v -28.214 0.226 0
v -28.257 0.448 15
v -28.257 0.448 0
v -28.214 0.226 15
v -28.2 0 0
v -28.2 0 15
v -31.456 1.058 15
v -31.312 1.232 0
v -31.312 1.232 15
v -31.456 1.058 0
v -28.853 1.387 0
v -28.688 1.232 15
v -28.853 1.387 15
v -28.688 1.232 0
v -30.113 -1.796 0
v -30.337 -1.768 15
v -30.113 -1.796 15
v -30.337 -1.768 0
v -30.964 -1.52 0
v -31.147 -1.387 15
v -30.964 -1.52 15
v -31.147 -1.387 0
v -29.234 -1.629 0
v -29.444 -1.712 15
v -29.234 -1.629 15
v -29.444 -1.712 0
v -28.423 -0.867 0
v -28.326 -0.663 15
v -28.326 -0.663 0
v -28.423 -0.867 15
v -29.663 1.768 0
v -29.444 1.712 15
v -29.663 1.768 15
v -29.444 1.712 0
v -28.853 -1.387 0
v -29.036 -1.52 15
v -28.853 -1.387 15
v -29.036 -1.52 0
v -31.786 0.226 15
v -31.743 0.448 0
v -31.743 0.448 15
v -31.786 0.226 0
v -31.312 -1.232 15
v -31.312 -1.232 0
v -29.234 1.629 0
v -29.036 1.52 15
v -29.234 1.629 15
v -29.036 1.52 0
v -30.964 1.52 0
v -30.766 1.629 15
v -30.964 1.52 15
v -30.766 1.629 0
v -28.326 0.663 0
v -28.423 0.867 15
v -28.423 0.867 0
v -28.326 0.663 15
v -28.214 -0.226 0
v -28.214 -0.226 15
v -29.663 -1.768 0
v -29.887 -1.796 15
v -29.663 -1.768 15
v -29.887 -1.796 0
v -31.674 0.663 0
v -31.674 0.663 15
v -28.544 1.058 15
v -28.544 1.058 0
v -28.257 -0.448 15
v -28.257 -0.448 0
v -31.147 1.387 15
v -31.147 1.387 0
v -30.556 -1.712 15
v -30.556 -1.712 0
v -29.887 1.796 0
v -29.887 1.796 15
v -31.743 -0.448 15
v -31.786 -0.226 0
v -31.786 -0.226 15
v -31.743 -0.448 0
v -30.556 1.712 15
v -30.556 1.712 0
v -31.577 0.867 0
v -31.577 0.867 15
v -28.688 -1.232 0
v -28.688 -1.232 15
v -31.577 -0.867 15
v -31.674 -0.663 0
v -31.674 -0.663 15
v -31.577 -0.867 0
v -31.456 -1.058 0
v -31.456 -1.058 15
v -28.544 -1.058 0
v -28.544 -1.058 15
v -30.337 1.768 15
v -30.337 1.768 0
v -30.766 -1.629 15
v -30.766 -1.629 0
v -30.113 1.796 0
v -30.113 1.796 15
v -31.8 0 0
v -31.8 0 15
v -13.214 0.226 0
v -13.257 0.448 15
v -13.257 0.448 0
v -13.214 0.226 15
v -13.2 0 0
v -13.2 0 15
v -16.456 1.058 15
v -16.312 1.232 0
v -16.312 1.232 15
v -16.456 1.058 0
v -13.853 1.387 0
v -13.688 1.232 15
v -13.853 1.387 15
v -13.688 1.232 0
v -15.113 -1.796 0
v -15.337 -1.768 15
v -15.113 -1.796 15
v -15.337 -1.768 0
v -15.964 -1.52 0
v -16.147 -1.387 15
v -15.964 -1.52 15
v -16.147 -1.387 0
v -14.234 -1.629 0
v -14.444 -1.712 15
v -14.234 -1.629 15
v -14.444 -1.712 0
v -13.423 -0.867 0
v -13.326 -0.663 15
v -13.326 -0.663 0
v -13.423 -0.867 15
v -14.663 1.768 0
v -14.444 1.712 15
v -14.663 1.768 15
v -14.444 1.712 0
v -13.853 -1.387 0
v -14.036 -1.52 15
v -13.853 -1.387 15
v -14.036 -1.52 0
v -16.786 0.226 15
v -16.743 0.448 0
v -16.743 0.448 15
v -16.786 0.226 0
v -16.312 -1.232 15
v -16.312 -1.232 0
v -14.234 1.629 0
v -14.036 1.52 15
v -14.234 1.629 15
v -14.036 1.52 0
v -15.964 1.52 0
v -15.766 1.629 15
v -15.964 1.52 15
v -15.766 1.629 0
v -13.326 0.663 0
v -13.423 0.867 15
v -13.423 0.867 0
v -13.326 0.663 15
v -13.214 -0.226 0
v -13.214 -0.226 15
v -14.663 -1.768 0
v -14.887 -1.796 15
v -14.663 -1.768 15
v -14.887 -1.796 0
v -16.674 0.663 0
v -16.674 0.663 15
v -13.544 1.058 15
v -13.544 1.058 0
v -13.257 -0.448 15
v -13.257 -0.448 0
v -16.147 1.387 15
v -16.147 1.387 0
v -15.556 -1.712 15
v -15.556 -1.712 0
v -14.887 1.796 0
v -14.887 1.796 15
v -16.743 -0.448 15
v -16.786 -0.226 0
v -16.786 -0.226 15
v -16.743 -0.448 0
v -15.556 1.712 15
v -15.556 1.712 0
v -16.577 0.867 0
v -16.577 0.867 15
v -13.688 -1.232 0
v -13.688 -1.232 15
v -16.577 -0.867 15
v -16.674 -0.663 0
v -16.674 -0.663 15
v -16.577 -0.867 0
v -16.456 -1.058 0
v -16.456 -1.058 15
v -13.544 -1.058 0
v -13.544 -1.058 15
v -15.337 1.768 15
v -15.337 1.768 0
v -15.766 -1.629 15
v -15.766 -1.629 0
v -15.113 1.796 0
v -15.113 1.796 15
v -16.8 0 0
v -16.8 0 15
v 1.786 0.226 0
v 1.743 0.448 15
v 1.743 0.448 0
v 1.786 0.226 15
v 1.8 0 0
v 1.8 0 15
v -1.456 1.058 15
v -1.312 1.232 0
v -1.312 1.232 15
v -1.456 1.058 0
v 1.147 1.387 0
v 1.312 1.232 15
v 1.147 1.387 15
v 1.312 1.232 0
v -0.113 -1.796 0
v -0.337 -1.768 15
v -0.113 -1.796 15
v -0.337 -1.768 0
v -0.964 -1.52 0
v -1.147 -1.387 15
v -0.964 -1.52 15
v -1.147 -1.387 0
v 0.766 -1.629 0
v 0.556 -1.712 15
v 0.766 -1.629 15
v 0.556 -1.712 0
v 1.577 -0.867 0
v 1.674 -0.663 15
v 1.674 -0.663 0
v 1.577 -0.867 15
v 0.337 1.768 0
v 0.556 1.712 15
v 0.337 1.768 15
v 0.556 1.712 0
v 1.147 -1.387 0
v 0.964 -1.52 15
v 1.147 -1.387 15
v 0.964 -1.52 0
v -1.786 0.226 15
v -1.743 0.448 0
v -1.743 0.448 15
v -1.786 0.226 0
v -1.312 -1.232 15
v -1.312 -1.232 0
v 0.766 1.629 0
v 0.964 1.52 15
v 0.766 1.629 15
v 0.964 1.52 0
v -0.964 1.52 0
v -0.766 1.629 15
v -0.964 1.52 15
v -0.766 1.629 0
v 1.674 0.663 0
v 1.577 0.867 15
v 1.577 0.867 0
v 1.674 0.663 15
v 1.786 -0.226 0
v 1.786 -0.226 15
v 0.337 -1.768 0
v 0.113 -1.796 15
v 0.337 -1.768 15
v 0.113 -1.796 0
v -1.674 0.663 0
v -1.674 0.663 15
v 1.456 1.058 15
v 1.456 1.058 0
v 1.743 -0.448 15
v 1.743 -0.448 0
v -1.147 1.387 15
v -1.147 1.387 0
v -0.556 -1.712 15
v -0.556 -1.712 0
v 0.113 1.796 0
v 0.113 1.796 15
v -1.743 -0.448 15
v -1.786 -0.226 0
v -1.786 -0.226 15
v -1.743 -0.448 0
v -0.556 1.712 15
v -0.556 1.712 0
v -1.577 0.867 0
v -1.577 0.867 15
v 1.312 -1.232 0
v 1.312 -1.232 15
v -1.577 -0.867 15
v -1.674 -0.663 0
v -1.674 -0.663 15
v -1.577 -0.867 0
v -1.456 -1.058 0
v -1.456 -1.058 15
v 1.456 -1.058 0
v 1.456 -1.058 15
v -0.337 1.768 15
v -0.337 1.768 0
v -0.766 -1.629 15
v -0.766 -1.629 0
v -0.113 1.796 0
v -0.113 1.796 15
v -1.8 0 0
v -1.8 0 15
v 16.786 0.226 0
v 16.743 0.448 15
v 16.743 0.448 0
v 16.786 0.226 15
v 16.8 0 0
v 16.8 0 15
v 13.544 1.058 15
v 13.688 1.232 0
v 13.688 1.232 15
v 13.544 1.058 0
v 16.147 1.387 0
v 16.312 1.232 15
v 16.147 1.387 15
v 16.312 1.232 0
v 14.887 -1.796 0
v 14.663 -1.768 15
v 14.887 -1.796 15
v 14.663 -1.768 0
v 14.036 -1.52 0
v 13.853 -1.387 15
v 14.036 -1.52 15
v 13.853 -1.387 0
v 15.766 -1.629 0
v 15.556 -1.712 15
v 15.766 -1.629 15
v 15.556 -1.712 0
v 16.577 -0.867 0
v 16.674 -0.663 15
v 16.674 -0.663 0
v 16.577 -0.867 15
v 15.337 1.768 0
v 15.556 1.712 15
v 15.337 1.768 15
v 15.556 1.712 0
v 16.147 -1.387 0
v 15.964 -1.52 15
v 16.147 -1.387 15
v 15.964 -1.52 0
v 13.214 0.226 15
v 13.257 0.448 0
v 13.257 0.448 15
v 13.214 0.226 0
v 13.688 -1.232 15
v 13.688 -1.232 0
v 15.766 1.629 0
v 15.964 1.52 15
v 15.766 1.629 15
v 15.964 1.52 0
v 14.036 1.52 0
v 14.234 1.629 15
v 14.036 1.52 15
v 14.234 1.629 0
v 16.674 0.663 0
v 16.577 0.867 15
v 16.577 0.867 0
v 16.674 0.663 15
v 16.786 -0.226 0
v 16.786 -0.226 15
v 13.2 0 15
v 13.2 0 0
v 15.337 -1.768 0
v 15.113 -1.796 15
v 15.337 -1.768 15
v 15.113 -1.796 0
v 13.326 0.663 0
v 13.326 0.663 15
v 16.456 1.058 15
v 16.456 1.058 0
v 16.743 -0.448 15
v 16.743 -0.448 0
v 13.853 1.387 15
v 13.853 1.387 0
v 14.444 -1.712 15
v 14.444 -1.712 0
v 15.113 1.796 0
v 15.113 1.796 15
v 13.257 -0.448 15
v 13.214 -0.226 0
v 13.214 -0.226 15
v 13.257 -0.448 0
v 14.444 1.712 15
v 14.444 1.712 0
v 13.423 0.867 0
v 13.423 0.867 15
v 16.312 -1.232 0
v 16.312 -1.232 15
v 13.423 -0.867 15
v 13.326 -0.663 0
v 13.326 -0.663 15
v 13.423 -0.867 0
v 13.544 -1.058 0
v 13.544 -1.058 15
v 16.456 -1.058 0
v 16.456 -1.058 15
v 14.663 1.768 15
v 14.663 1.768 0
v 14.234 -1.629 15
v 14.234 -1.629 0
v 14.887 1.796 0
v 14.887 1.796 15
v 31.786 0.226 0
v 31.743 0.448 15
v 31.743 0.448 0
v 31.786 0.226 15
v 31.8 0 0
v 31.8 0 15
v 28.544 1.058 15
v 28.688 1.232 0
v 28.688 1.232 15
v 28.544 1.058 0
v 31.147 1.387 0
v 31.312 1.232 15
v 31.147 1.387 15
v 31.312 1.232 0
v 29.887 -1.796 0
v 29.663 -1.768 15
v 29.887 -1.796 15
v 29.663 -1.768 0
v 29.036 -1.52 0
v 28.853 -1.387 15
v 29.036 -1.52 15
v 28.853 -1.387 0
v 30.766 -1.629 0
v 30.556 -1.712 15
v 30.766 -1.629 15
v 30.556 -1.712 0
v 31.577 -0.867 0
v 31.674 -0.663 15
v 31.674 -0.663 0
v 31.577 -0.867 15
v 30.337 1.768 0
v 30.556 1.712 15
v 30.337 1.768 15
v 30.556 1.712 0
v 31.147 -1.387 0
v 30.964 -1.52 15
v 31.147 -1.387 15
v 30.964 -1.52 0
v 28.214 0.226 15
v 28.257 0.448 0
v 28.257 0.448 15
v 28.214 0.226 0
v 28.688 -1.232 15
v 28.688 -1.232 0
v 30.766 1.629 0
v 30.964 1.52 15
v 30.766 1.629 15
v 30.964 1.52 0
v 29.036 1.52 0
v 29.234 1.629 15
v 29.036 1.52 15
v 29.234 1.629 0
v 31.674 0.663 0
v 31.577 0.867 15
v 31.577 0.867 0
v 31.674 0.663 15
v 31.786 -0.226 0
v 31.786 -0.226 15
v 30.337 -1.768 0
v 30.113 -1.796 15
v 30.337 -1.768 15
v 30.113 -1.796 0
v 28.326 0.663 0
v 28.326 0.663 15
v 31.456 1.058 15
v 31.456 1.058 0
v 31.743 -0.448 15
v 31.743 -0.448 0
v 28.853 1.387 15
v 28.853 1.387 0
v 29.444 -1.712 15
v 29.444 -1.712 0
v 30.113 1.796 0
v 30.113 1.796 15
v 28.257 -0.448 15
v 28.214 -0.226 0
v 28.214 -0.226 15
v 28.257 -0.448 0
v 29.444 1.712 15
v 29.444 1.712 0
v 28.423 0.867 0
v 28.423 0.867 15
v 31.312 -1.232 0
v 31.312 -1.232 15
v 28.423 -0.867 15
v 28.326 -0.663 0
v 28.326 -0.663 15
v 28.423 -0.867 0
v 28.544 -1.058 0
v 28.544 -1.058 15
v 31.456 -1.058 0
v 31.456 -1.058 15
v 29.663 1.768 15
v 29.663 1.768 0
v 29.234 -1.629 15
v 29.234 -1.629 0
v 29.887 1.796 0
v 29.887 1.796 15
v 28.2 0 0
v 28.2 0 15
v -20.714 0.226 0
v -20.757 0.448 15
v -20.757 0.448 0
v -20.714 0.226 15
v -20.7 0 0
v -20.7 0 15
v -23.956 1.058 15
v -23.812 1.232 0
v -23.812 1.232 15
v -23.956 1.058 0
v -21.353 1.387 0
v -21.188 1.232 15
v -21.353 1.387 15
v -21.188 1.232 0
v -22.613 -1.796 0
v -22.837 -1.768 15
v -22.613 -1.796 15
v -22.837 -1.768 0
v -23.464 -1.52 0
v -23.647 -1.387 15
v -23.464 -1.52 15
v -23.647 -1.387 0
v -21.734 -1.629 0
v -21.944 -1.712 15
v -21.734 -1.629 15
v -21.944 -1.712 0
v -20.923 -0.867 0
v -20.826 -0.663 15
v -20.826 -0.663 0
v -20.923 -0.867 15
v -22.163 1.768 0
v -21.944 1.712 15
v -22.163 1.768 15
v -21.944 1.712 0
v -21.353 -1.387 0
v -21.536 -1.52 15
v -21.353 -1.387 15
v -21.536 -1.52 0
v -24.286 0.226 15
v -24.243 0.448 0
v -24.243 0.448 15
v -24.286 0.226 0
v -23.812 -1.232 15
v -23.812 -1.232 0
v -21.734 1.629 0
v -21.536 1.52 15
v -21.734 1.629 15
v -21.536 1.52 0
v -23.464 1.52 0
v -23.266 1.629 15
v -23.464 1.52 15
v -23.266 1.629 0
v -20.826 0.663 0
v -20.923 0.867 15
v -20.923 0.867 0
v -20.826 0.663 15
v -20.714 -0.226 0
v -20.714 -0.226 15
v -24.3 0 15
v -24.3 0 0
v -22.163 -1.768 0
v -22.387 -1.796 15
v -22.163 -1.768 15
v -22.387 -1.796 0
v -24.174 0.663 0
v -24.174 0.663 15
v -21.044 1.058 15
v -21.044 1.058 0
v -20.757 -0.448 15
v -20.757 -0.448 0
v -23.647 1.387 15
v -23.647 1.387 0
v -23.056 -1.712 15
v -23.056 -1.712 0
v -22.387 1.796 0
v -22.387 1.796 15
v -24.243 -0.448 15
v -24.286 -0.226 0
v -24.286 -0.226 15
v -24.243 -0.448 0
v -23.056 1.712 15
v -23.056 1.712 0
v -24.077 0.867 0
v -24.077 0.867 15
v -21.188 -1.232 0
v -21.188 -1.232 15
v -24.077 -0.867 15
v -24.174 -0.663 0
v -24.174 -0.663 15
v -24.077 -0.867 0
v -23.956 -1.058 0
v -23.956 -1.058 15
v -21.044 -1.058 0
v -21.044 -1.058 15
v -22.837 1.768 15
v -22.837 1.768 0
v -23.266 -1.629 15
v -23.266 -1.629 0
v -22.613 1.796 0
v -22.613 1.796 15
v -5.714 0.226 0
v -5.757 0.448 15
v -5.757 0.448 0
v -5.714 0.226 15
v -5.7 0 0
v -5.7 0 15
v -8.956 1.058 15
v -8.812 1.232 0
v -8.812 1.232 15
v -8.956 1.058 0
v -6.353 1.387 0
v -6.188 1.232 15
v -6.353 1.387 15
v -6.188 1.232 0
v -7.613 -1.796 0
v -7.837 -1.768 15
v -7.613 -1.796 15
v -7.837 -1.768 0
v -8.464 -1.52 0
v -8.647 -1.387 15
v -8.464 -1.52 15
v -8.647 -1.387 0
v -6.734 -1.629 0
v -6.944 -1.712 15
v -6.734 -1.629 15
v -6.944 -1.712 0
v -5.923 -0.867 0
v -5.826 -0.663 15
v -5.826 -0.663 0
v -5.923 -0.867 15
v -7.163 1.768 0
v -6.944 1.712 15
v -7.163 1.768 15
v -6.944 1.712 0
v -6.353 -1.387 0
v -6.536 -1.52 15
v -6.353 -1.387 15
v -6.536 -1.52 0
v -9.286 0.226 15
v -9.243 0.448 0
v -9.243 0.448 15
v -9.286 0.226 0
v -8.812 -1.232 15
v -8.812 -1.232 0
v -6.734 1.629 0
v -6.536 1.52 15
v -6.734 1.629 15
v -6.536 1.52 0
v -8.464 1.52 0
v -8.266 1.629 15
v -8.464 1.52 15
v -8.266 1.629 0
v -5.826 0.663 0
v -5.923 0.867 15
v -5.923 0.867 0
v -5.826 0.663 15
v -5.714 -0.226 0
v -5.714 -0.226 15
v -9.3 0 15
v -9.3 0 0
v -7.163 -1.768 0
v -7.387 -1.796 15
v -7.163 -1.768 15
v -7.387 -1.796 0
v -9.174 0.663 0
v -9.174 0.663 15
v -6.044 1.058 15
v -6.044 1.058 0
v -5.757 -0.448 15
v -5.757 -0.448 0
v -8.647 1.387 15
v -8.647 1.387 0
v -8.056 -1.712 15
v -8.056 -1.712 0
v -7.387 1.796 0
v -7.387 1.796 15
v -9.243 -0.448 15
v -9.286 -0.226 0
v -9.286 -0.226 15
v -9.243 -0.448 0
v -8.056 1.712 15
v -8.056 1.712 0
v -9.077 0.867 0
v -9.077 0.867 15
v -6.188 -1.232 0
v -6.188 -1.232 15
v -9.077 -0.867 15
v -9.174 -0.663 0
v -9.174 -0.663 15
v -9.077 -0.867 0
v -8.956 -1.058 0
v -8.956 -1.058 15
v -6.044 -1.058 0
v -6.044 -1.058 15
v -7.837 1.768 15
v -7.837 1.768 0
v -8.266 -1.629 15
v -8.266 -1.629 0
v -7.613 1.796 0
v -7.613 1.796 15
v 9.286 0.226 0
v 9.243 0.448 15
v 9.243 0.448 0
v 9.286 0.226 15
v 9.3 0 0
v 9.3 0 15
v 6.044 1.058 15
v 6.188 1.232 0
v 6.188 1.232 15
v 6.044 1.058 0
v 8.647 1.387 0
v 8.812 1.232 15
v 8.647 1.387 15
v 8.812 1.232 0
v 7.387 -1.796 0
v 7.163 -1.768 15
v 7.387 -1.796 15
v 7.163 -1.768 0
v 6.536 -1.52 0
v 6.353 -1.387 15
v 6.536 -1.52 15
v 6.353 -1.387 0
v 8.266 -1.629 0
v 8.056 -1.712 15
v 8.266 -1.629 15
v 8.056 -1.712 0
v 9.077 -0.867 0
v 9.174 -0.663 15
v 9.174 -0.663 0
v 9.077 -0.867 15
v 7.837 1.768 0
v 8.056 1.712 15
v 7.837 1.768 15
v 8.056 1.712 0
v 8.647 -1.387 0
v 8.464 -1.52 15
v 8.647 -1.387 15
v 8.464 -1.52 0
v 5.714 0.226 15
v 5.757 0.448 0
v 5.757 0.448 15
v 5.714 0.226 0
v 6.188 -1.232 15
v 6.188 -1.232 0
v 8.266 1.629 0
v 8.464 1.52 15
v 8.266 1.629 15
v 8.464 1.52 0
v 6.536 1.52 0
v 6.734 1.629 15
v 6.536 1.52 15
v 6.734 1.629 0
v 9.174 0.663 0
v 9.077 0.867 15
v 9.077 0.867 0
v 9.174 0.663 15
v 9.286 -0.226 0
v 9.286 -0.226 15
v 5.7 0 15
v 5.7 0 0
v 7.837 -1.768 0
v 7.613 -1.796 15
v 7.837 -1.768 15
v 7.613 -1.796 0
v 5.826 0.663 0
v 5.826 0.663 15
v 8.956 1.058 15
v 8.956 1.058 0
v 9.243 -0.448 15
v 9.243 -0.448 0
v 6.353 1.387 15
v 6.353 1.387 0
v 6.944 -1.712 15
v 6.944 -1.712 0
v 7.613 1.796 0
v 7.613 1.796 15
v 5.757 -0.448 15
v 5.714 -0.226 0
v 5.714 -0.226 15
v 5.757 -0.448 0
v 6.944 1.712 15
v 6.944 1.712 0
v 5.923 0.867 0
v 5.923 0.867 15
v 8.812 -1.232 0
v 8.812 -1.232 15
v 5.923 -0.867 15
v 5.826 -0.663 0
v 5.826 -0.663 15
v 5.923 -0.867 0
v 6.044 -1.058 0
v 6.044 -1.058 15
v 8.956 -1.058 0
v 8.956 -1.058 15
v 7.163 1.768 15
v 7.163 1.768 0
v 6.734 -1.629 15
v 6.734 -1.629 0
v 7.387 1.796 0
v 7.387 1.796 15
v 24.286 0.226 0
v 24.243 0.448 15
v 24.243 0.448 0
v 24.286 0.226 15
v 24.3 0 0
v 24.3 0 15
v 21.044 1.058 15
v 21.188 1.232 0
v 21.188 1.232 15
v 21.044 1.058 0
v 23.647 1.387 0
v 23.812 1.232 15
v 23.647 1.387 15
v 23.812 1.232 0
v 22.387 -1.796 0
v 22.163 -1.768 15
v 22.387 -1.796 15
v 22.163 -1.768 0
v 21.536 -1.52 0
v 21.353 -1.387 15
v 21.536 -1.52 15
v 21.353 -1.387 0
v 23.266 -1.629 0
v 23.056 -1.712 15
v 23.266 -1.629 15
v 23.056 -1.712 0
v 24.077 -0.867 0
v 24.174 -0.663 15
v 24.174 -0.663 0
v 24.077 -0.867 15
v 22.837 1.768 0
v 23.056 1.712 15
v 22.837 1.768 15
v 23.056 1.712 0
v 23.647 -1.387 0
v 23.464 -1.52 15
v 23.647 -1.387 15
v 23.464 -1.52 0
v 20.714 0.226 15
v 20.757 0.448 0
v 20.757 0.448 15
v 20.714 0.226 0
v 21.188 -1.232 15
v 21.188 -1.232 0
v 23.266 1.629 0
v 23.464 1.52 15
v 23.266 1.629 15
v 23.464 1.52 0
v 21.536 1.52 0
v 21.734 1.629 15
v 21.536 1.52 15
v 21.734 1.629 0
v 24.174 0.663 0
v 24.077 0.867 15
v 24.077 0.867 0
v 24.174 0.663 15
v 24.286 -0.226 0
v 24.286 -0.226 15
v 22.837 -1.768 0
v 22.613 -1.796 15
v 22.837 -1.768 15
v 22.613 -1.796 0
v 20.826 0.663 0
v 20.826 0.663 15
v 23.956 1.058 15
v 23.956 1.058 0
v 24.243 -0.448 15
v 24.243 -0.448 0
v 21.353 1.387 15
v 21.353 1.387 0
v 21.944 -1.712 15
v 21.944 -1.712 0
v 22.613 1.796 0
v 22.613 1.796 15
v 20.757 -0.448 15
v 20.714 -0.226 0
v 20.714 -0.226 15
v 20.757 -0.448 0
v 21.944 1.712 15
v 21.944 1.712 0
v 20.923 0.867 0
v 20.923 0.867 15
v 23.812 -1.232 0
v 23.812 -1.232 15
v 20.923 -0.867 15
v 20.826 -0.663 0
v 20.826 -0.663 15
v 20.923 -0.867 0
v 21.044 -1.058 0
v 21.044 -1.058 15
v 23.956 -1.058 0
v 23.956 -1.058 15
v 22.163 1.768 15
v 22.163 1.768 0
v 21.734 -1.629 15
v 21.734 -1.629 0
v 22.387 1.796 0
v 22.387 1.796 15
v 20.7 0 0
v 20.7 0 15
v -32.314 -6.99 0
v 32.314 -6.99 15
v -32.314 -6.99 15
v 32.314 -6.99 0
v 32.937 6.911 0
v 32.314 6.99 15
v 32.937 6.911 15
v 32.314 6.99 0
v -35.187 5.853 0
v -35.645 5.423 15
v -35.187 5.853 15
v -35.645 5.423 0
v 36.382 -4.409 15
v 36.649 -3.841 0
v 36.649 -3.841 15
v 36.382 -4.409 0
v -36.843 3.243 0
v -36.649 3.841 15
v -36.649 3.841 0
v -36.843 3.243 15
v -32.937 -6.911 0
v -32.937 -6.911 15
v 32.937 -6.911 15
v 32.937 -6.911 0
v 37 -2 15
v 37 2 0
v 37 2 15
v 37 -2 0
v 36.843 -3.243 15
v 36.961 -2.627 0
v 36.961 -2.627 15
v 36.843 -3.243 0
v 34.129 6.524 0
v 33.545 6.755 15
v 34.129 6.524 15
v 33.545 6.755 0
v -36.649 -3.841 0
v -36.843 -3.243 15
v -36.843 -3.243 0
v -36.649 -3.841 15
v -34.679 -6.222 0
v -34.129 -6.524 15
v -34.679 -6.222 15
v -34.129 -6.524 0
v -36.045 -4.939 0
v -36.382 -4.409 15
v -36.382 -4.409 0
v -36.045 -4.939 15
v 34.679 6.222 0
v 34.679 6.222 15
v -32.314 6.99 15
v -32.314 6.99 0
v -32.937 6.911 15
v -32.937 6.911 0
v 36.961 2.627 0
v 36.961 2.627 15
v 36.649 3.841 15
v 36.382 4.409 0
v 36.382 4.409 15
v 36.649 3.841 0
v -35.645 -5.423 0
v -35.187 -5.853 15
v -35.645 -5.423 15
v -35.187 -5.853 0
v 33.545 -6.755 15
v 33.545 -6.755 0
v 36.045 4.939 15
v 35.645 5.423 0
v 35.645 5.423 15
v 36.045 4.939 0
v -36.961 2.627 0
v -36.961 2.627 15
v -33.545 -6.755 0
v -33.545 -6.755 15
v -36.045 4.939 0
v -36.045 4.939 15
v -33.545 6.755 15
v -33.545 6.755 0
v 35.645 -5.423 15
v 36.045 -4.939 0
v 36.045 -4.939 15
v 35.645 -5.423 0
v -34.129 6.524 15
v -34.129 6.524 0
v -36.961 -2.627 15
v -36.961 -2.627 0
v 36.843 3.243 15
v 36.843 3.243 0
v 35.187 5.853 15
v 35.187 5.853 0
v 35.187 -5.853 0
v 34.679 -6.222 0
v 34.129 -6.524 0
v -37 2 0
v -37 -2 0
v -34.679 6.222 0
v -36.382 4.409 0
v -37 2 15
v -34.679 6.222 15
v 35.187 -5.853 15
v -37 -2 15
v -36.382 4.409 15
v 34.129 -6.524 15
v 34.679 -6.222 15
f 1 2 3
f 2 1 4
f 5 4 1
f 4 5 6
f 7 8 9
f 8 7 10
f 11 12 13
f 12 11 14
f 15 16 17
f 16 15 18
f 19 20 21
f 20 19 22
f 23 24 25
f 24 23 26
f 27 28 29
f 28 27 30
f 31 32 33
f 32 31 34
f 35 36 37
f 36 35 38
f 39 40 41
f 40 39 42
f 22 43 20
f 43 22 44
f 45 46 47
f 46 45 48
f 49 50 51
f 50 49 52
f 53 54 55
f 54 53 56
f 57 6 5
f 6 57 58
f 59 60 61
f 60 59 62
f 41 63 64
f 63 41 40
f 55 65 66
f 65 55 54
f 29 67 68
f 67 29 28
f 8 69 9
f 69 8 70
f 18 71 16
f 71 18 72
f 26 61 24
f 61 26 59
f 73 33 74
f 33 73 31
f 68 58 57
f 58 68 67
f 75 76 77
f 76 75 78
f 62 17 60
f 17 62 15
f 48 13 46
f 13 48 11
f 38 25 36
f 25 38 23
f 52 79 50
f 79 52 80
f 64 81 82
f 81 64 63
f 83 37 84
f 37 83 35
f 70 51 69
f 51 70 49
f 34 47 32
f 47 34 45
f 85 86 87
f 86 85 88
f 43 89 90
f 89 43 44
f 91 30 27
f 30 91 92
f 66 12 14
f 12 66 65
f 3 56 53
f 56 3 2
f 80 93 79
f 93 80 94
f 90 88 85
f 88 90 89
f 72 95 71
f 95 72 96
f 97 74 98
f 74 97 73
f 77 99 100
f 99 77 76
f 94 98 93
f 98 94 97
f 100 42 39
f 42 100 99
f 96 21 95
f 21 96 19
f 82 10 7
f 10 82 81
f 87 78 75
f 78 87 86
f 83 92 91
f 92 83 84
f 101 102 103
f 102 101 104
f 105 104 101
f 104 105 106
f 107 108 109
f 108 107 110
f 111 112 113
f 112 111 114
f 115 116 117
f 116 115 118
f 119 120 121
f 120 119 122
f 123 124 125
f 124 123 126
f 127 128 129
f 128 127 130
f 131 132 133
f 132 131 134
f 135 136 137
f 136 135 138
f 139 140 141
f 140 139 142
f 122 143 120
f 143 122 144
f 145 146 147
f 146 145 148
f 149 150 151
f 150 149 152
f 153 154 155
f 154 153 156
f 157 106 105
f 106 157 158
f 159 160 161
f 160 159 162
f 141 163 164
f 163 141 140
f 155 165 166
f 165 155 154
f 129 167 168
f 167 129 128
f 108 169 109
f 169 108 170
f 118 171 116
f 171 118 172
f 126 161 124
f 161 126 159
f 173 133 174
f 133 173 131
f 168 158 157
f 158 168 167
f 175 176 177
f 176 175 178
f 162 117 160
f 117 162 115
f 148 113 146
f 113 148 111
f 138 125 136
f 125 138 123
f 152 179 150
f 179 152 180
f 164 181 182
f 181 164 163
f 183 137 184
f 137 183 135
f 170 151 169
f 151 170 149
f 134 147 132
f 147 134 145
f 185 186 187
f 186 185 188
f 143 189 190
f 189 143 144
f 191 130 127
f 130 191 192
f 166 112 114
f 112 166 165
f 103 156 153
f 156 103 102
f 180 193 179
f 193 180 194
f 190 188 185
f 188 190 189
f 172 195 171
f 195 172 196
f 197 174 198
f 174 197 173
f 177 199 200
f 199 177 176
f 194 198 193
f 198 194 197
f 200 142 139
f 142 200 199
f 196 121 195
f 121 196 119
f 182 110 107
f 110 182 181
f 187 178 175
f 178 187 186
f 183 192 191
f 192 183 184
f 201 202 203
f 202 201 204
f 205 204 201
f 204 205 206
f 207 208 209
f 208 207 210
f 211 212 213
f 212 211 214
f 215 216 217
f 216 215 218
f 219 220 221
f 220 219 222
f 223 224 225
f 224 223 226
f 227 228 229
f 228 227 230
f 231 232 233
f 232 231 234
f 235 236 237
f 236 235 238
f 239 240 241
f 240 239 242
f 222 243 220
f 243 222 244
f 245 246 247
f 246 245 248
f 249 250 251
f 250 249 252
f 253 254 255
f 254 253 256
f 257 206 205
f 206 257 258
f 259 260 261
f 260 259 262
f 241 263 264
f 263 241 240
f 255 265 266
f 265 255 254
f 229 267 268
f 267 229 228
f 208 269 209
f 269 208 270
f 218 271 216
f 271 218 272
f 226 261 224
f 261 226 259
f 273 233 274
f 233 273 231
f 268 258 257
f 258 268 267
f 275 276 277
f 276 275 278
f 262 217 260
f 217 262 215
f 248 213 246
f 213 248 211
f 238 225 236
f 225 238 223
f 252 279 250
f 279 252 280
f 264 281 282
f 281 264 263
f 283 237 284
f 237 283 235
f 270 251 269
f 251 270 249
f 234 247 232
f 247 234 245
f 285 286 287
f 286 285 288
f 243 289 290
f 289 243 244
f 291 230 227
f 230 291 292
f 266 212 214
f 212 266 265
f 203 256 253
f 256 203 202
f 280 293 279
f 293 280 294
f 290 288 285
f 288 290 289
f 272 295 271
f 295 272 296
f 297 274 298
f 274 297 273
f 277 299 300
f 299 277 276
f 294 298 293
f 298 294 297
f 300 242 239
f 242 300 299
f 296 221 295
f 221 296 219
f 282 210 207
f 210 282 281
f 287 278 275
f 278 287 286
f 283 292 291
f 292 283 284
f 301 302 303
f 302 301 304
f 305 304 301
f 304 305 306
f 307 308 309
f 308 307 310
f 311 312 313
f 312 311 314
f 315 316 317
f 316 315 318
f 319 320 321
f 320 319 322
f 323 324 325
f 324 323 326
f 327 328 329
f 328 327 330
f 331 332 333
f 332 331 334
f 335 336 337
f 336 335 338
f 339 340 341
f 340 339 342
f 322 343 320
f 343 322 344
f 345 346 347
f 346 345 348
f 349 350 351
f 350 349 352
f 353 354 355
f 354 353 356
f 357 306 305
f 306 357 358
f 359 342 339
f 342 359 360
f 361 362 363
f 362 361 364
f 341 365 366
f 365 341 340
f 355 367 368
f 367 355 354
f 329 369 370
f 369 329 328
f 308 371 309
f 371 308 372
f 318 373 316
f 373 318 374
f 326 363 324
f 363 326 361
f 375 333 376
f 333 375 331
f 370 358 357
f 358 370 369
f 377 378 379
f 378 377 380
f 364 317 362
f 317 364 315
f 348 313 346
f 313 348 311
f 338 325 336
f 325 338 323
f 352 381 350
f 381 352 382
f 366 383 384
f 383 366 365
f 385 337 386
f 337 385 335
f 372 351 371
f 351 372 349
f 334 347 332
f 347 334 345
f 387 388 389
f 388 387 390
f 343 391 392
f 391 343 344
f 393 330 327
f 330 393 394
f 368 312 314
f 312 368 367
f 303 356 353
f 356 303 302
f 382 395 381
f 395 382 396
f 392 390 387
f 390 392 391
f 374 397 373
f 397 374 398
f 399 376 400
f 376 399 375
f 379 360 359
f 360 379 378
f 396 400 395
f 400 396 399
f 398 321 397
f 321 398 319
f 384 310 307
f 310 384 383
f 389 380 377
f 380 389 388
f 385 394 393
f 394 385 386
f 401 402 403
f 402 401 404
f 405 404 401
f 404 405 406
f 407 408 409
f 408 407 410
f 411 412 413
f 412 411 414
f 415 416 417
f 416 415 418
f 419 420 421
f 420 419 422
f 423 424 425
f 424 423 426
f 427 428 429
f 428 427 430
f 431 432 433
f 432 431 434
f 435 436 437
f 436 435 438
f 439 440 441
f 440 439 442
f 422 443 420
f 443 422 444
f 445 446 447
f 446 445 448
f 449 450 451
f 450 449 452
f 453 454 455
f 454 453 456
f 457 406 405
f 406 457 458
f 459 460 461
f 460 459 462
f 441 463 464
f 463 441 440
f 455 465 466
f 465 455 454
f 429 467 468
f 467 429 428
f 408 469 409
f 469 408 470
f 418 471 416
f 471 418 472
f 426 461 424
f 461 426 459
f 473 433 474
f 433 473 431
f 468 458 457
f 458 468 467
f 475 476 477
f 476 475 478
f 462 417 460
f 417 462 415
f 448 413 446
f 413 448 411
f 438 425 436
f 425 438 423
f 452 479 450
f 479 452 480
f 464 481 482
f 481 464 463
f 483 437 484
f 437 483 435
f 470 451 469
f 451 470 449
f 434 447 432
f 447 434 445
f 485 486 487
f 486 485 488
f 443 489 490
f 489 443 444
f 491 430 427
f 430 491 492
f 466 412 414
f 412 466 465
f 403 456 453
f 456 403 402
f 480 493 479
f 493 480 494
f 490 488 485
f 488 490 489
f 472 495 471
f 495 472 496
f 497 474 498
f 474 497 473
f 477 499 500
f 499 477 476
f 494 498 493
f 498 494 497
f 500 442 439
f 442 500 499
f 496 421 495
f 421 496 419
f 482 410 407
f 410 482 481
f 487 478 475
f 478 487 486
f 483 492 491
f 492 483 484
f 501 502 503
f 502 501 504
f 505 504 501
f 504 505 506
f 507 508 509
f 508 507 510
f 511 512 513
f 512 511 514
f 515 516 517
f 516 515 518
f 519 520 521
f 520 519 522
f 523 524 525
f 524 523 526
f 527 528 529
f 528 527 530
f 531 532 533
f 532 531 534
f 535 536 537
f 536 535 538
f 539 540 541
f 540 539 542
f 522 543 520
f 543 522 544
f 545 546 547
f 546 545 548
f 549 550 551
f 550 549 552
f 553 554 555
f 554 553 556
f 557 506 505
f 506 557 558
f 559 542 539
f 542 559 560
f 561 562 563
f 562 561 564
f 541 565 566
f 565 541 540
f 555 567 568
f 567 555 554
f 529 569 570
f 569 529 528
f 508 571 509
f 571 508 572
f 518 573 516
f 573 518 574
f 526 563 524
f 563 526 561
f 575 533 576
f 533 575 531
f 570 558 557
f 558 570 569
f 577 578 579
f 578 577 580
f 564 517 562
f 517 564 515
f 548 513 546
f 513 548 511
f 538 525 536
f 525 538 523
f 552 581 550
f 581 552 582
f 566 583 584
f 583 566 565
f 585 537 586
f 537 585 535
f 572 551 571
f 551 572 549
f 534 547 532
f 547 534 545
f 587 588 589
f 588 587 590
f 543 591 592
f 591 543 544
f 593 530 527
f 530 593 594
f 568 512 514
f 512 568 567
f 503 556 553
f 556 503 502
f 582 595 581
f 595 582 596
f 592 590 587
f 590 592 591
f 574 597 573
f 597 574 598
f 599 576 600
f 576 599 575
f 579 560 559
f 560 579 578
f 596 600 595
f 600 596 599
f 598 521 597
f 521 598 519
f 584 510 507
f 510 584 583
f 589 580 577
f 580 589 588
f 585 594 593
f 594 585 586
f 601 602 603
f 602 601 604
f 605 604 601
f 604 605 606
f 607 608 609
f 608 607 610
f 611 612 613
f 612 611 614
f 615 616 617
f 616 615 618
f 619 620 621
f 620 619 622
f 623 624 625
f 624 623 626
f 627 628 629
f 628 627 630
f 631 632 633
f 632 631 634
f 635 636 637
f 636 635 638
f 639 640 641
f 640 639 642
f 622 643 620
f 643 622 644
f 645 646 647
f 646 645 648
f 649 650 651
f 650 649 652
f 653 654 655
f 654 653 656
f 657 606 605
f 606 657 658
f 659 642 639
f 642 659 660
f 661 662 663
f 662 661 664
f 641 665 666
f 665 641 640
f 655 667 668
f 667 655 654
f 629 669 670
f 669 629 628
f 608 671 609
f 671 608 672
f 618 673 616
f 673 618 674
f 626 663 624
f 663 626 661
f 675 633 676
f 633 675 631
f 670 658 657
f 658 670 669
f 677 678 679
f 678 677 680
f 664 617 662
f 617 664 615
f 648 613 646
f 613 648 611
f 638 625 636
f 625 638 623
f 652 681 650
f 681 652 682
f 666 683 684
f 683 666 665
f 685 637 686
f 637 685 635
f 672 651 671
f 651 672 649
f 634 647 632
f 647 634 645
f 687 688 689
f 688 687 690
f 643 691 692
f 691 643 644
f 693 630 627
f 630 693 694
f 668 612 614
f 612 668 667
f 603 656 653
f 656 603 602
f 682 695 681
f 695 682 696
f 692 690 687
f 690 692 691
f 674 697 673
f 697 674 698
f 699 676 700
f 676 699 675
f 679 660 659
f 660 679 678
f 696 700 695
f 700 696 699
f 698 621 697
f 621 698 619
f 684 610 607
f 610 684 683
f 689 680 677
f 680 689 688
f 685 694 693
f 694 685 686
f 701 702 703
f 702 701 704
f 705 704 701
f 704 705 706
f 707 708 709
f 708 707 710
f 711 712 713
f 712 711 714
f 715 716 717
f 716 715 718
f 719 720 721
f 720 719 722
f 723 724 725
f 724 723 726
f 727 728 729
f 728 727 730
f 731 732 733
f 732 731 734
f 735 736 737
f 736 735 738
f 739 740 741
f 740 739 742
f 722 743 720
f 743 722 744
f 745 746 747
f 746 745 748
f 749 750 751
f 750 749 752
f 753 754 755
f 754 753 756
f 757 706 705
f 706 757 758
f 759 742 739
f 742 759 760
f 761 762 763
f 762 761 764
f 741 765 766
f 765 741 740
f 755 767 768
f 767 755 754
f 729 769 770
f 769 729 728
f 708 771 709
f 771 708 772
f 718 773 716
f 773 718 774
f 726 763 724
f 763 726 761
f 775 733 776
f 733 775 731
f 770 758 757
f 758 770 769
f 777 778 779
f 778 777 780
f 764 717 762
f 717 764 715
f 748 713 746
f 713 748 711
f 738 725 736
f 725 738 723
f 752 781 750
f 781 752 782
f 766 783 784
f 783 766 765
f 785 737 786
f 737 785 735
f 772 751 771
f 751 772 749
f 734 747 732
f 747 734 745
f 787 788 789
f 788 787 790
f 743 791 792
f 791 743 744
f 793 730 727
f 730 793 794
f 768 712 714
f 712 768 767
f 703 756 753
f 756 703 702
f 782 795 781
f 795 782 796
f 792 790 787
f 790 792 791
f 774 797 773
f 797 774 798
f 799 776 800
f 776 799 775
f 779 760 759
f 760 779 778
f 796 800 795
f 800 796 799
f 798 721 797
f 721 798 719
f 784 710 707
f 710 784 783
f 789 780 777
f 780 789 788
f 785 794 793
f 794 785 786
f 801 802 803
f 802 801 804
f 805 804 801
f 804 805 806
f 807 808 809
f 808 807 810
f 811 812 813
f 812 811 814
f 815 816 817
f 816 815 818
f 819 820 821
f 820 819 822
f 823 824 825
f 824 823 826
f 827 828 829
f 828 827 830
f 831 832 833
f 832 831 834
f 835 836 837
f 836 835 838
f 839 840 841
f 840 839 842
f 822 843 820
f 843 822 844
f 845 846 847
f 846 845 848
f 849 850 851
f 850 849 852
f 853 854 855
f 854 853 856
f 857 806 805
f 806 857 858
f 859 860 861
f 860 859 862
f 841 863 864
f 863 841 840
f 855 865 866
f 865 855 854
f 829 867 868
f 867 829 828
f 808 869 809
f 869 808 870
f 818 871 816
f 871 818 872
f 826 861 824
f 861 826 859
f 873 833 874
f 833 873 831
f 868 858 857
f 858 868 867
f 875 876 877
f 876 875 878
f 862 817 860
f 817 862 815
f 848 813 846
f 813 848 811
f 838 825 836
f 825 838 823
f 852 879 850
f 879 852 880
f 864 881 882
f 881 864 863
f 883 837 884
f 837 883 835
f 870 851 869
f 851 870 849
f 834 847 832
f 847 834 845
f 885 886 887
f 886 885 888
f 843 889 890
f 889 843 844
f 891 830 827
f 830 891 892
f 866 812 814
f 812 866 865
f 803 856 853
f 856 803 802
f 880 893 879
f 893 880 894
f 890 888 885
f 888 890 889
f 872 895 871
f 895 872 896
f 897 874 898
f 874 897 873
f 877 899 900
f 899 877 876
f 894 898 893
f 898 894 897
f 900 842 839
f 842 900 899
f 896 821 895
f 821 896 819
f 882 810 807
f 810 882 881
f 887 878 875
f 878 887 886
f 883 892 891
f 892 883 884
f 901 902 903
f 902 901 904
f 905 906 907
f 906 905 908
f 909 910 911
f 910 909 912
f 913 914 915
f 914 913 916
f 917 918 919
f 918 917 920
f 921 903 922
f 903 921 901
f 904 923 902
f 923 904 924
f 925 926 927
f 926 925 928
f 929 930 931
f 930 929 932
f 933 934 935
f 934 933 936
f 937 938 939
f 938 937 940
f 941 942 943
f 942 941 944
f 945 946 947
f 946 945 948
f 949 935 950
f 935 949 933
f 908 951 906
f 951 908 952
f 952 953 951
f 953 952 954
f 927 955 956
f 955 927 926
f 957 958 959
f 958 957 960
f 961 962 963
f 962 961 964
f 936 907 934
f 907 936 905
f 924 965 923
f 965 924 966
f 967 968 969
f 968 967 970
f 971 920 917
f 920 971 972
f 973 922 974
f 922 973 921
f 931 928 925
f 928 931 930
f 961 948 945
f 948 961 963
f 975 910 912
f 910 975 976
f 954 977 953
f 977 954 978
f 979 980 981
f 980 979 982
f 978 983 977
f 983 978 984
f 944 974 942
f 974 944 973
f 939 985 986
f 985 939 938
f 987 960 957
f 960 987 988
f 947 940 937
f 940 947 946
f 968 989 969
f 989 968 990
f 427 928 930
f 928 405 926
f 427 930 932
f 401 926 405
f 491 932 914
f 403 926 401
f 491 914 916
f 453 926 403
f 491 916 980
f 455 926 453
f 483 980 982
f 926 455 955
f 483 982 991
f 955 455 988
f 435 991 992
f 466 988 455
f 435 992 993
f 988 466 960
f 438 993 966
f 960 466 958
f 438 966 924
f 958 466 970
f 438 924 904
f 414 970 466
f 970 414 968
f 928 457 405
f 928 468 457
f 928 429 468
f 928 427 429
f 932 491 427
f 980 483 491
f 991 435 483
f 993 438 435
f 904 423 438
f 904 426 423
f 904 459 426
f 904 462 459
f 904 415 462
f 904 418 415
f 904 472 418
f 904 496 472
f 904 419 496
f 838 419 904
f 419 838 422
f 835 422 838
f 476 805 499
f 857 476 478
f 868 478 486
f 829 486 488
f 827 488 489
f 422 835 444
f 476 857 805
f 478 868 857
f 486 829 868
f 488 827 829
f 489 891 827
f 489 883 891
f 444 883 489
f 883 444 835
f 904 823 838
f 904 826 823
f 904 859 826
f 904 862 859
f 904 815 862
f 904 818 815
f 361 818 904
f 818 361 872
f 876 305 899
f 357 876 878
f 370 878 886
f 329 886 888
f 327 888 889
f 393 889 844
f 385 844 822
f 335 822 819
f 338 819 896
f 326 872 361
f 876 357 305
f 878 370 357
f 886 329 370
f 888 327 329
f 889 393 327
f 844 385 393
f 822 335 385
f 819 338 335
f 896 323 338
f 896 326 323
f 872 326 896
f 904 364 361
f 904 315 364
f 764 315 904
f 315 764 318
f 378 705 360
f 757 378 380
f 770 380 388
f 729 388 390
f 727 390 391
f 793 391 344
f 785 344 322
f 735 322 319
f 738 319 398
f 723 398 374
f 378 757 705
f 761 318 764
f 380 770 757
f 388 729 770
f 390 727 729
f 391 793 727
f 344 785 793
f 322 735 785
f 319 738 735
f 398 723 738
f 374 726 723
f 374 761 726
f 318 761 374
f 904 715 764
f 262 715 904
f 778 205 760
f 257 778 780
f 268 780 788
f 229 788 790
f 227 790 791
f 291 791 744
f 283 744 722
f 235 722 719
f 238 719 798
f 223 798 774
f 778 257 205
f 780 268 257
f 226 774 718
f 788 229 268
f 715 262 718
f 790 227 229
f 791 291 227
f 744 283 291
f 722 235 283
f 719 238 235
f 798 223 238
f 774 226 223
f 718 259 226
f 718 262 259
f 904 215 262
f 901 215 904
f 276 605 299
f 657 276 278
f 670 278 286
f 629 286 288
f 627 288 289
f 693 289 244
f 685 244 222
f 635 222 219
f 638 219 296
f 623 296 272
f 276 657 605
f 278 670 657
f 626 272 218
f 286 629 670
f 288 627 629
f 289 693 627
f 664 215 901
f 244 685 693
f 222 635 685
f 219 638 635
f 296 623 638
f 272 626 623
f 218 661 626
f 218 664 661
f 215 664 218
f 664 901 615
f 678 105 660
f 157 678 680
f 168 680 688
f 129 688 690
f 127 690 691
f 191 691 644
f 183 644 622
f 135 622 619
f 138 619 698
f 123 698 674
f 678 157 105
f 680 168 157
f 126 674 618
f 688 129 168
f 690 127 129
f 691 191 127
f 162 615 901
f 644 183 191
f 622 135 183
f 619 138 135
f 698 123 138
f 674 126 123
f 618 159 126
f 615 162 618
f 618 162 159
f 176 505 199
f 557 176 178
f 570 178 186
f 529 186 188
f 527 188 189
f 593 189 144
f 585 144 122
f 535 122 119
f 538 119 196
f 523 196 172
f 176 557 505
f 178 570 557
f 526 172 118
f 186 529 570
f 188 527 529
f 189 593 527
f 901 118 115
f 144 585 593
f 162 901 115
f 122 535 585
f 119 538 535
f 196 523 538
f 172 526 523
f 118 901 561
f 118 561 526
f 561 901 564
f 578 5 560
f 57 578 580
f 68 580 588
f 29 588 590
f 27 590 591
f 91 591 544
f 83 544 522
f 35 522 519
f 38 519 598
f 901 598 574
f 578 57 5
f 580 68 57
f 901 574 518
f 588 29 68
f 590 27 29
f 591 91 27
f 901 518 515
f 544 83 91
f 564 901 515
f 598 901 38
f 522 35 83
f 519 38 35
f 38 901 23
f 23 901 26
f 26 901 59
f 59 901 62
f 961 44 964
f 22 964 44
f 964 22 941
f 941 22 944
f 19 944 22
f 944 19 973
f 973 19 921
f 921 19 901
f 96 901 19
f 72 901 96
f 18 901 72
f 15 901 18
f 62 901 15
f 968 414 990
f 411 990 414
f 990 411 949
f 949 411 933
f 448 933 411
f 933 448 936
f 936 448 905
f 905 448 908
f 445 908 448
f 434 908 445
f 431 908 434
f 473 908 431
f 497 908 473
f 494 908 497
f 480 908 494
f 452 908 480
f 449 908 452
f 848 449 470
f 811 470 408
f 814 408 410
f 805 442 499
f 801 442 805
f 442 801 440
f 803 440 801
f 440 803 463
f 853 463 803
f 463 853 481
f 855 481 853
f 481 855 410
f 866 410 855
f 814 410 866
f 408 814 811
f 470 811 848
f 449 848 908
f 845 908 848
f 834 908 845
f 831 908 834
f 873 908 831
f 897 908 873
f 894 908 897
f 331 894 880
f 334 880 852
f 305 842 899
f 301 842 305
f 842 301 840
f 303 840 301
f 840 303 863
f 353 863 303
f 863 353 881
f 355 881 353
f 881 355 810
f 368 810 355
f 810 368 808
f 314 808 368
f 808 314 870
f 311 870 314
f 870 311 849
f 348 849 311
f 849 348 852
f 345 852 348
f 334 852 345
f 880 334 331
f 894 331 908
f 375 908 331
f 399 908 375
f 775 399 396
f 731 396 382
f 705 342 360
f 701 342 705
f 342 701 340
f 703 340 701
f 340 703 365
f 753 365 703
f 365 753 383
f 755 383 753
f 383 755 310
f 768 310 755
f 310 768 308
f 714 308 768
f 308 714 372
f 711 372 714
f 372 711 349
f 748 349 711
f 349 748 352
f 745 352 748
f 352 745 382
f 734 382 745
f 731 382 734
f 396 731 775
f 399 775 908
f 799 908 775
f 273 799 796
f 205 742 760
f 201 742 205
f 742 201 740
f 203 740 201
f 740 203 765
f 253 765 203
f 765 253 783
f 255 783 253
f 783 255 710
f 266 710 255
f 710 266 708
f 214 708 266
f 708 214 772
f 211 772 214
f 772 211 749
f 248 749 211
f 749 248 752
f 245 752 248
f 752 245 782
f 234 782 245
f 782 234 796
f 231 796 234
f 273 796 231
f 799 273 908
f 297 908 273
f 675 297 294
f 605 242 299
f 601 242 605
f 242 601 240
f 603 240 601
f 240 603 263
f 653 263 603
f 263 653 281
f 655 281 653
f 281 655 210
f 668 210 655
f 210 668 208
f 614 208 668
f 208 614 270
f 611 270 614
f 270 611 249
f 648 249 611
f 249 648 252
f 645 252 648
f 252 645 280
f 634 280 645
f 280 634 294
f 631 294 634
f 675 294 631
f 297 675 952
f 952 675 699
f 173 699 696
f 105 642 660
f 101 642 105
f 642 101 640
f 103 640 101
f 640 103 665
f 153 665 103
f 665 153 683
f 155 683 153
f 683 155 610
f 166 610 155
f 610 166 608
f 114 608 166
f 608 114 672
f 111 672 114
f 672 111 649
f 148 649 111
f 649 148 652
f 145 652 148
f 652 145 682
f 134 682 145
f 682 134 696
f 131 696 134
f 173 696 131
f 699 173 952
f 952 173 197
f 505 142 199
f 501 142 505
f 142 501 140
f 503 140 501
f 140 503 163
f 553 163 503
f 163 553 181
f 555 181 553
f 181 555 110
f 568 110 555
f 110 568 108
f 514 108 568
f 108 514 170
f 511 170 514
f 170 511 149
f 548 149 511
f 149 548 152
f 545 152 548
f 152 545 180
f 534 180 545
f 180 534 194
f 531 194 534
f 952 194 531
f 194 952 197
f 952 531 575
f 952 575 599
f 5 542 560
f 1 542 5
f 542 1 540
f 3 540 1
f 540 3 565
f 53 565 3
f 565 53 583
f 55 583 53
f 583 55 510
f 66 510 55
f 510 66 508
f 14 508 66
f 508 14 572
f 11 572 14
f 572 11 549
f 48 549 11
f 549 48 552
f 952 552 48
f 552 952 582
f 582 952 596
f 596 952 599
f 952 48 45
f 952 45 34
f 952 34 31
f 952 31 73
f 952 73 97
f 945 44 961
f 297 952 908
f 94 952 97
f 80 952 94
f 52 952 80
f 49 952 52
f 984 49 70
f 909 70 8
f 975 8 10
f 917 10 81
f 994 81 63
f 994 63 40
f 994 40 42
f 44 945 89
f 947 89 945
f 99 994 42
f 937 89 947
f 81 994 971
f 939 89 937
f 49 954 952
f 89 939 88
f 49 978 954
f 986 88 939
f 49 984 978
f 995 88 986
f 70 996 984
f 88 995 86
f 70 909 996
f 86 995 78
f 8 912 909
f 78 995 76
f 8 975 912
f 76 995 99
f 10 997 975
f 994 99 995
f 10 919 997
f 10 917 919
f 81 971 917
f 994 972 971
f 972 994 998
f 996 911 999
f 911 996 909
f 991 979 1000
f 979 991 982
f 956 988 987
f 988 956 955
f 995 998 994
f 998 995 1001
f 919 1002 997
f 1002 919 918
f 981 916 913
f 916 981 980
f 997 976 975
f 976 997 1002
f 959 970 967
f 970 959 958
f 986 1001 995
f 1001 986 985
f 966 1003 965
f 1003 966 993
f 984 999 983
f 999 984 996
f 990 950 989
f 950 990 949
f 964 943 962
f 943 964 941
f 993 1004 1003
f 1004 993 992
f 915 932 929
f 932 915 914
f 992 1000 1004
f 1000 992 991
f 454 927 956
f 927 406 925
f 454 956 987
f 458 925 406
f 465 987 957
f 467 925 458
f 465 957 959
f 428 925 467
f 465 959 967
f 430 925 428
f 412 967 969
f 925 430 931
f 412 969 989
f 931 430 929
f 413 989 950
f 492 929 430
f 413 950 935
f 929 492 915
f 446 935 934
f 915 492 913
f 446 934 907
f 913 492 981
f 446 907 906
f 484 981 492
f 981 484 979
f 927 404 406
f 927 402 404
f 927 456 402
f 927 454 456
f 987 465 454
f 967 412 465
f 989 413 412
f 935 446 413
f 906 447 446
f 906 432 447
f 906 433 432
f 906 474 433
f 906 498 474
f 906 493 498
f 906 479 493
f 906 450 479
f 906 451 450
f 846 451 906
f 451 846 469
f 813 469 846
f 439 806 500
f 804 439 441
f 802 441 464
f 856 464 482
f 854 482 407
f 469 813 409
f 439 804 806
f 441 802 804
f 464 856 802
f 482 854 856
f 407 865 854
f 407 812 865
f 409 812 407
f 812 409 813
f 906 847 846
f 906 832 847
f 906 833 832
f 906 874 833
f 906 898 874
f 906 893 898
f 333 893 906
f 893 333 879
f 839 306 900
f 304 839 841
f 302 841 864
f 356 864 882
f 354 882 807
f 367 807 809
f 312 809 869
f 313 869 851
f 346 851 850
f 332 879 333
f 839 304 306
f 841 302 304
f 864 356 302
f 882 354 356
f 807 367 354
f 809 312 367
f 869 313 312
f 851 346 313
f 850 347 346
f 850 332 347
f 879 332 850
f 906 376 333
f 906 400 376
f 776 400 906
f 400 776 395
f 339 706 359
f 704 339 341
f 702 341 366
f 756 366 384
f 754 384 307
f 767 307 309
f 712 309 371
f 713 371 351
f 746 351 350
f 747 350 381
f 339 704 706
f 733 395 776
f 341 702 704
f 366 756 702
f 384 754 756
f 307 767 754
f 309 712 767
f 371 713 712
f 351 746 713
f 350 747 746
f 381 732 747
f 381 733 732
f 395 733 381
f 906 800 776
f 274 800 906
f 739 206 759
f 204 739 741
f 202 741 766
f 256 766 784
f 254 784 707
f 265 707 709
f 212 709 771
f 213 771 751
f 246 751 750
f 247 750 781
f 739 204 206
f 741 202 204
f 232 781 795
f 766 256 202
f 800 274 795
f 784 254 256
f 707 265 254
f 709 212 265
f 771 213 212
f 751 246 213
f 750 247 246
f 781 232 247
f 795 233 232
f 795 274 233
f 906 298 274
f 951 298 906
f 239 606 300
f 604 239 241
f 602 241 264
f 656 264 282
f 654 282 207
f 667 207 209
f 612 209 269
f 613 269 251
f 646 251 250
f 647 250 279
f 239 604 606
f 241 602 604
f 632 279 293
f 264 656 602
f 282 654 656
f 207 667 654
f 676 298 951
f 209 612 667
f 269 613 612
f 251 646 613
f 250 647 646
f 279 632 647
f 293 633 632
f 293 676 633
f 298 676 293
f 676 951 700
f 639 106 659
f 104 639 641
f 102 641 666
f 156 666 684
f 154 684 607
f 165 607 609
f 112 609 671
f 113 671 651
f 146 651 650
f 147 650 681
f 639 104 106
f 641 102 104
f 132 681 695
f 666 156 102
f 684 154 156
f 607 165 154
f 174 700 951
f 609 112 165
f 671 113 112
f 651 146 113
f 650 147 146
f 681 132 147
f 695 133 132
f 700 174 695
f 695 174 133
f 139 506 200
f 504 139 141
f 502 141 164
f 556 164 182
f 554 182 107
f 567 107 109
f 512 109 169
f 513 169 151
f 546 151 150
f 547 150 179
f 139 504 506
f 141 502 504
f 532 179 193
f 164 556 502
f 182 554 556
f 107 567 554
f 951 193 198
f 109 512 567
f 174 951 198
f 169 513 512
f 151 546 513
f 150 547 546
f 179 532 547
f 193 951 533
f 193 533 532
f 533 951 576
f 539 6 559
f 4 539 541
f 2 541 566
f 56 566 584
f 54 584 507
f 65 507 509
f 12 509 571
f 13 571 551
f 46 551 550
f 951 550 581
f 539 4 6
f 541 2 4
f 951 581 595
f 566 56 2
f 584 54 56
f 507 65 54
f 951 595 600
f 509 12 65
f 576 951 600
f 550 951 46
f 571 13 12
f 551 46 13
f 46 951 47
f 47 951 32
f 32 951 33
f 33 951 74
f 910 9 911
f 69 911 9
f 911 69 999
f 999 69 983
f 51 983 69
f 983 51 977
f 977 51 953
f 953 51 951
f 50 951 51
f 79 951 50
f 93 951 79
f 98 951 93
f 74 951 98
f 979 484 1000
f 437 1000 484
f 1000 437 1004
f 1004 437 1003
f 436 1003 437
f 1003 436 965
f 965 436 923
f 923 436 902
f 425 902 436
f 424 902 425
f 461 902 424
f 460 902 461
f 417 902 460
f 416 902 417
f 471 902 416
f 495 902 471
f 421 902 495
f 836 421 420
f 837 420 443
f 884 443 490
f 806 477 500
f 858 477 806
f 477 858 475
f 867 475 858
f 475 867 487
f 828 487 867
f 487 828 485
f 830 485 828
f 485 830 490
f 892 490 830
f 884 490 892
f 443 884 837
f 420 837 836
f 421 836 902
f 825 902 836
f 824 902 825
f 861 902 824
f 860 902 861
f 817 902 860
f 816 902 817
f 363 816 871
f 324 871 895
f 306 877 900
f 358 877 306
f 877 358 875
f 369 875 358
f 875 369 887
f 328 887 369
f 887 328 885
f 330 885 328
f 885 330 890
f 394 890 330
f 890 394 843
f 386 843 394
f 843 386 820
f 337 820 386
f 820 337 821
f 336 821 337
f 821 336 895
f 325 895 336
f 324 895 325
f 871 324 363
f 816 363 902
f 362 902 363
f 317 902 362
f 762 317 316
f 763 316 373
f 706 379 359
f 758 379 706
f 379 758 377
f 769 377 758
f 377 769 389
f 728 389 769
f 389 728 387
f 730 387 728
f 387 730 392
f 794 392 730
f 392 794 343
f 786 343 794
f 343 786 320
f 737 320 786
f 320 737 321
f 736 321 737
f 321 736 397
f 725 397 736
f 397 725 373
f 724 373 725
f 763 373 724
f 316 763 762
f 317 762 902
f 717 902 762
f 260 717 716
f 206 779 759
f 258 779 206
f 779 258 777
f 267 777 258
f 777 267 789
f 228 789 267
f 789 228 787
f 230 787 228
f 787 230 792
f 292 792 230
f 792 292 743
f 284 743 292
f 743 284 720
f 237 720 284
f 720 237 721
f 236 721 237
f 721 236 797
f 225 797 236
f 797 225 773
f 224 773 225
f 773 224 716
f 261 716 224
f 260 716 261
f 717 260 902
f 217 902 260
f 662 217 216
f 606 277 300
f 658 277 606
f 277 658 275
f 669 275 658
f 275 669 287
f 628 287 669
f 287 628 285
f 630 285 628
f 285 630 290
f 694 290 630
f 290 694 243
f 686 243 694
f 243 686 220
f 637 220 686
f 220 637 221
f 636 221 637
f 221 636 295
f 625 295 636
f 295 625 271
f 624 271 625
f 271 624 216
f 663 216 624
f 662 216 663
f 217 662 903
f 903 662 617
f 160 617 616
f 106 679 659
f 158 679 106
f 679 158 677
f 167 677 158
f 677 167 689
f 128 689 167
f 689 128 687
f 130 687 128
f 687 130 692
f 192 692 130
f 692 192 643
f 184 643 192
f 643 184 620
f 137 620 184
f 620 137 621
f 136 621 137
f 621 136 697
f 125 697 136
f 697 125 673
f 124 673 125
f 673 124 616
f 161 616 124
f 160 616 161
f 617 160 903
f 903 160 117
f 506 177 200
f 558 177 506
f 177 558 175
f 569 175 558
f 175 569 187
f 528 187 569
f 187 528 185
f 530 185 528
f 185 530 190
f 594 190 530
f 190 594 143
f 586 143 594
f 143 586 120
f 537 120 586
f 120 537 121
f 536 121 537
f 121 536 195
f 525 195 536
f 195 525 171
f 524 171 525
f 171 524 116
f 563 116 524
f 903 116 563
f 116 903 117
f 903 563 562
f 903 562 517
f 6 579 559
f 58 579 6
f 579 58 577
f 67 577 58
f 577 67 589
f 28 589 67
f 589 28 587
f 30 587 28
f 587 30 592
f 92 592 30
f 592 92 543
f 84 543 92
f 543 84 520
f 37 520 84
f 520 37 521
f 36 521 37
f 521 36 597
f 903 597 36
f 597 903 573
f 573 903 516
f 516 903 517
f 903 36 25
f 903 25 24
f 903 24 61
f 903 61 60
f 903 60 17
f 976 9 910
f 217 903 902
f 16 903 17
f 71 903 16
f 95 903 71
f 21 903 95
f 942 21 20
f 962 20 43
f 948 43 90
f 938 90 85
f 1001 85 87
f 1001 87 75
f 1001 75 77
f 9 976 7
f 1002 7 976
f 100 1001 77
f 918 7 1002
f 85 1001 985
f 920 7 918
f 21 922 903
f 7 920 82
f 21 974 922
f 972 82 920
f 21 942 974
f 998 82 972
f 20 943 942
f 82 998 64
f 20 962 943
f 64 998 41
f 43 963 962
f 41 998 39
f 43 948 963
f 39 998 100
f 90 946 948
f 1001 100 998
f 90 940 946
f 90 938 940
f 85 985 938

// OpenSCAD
$fn = 50;


difference() {
	union() {
		hull() {
			translate(v = [-32.0000000000, 2.0000000000, 0]) {
				cylinder(h = 15, r = 5);
			}
			translate(v = [32.0000000000, 2.0000000000, 0]) {
				cylinder(h = 15, r = 5);
			}
			translate(v = [-32.0000000000, -2.0000000000, 0]) {
				cylinder(h = 15, r = 5);
			}
			translate(v = [32.0000000000, -2.0000000000, 0]) {
				cylinder(h = 15, r = 5);
			}
		}
	}
	union() {
		translate(v = [-30.0000000000, 0.0000000000, 0]) {
			translate(v = [0, 0, -100]) {
				cylinder(h = 200, r = 1.8000000000);
			}
		}
		translate(v = [-15.0000000000, 0.0000000000, 0]) {
			translate(v = [0, 0, -100]) {
				cylinder(h = 200, r = 1.8000000000);
			}
		}
		translate(v = [0, 0, -100]) {
			cylinder(h = 200, r = 1.8000000000);
		}
		translate(v = [15.0000000000, 0.0000000000, 0]) {
			translate(v = [0, 0, -100]) {
				cylinder(h = 200, r = 1.8000000000);
			}
		}
		translate(v = [30.0000000000, 0.0000000000, 0]) {
			translate(v = [0, 0, -100]) {
				cylinder(h = 200, r = 1.8000000000);
			}
		}
		translate(v = [-30.0000000000, 0.0000000000, 0]) {
			translate(v = [0, 0, -100]) {
				cylinder(h = 200, r = 1.8000000000);
			}
		}
		translate(v = [-22.5000000000, 0.0000000000, 0]) {
			translate(v = [0, 0, -100]) {
				cylinder(h = 200, r = 1.8000000000);
			}
		}
		translate(v = [-15.0000000000, 0.0000000000, 0]) {
			translate(v = [0, 0, -100]) {
				cylinder(h = 200, r = 1.8000000000);
			}
		}
		translate(v = [-7.5000000000, 0.0000000000, 0]) {
			translate(v = [0, 0, -100]) {
				cylinder(h = 200, r = 1.8000000000);
			}
		}
		translate(v = [0, 0, -100]) {
			cylinder(h = 200, r = 1.8000000000);
		}
		translate(v = [7.5000000000, 0.0000000000, 0]) {
			translate(v = [0, 0, -100]) {
				cylinder(h = 200, r = 1.8000000000);
			}
		}
		translate(v = [15.0000000000, 0.0000000000, 0]) {
			translate(v = [0, 0, -100]) {
				cylinder(h = 200, r = 1.8000000000);
			}
		}
		translate(v = [22.5000000000, 0.0000000000, 0]) {
			translate(v = [0, 0, -100]) {
				cylinder(h = 200, r = 1.8000000000);
			}
		}
		translate(v = [30.0000000000, 0.0000000000, 0]) {
			translate(v = [0, 0, -100]) {
				cylinder(h = 200, r = 1.8000000000);
			}
		}
	}
}
